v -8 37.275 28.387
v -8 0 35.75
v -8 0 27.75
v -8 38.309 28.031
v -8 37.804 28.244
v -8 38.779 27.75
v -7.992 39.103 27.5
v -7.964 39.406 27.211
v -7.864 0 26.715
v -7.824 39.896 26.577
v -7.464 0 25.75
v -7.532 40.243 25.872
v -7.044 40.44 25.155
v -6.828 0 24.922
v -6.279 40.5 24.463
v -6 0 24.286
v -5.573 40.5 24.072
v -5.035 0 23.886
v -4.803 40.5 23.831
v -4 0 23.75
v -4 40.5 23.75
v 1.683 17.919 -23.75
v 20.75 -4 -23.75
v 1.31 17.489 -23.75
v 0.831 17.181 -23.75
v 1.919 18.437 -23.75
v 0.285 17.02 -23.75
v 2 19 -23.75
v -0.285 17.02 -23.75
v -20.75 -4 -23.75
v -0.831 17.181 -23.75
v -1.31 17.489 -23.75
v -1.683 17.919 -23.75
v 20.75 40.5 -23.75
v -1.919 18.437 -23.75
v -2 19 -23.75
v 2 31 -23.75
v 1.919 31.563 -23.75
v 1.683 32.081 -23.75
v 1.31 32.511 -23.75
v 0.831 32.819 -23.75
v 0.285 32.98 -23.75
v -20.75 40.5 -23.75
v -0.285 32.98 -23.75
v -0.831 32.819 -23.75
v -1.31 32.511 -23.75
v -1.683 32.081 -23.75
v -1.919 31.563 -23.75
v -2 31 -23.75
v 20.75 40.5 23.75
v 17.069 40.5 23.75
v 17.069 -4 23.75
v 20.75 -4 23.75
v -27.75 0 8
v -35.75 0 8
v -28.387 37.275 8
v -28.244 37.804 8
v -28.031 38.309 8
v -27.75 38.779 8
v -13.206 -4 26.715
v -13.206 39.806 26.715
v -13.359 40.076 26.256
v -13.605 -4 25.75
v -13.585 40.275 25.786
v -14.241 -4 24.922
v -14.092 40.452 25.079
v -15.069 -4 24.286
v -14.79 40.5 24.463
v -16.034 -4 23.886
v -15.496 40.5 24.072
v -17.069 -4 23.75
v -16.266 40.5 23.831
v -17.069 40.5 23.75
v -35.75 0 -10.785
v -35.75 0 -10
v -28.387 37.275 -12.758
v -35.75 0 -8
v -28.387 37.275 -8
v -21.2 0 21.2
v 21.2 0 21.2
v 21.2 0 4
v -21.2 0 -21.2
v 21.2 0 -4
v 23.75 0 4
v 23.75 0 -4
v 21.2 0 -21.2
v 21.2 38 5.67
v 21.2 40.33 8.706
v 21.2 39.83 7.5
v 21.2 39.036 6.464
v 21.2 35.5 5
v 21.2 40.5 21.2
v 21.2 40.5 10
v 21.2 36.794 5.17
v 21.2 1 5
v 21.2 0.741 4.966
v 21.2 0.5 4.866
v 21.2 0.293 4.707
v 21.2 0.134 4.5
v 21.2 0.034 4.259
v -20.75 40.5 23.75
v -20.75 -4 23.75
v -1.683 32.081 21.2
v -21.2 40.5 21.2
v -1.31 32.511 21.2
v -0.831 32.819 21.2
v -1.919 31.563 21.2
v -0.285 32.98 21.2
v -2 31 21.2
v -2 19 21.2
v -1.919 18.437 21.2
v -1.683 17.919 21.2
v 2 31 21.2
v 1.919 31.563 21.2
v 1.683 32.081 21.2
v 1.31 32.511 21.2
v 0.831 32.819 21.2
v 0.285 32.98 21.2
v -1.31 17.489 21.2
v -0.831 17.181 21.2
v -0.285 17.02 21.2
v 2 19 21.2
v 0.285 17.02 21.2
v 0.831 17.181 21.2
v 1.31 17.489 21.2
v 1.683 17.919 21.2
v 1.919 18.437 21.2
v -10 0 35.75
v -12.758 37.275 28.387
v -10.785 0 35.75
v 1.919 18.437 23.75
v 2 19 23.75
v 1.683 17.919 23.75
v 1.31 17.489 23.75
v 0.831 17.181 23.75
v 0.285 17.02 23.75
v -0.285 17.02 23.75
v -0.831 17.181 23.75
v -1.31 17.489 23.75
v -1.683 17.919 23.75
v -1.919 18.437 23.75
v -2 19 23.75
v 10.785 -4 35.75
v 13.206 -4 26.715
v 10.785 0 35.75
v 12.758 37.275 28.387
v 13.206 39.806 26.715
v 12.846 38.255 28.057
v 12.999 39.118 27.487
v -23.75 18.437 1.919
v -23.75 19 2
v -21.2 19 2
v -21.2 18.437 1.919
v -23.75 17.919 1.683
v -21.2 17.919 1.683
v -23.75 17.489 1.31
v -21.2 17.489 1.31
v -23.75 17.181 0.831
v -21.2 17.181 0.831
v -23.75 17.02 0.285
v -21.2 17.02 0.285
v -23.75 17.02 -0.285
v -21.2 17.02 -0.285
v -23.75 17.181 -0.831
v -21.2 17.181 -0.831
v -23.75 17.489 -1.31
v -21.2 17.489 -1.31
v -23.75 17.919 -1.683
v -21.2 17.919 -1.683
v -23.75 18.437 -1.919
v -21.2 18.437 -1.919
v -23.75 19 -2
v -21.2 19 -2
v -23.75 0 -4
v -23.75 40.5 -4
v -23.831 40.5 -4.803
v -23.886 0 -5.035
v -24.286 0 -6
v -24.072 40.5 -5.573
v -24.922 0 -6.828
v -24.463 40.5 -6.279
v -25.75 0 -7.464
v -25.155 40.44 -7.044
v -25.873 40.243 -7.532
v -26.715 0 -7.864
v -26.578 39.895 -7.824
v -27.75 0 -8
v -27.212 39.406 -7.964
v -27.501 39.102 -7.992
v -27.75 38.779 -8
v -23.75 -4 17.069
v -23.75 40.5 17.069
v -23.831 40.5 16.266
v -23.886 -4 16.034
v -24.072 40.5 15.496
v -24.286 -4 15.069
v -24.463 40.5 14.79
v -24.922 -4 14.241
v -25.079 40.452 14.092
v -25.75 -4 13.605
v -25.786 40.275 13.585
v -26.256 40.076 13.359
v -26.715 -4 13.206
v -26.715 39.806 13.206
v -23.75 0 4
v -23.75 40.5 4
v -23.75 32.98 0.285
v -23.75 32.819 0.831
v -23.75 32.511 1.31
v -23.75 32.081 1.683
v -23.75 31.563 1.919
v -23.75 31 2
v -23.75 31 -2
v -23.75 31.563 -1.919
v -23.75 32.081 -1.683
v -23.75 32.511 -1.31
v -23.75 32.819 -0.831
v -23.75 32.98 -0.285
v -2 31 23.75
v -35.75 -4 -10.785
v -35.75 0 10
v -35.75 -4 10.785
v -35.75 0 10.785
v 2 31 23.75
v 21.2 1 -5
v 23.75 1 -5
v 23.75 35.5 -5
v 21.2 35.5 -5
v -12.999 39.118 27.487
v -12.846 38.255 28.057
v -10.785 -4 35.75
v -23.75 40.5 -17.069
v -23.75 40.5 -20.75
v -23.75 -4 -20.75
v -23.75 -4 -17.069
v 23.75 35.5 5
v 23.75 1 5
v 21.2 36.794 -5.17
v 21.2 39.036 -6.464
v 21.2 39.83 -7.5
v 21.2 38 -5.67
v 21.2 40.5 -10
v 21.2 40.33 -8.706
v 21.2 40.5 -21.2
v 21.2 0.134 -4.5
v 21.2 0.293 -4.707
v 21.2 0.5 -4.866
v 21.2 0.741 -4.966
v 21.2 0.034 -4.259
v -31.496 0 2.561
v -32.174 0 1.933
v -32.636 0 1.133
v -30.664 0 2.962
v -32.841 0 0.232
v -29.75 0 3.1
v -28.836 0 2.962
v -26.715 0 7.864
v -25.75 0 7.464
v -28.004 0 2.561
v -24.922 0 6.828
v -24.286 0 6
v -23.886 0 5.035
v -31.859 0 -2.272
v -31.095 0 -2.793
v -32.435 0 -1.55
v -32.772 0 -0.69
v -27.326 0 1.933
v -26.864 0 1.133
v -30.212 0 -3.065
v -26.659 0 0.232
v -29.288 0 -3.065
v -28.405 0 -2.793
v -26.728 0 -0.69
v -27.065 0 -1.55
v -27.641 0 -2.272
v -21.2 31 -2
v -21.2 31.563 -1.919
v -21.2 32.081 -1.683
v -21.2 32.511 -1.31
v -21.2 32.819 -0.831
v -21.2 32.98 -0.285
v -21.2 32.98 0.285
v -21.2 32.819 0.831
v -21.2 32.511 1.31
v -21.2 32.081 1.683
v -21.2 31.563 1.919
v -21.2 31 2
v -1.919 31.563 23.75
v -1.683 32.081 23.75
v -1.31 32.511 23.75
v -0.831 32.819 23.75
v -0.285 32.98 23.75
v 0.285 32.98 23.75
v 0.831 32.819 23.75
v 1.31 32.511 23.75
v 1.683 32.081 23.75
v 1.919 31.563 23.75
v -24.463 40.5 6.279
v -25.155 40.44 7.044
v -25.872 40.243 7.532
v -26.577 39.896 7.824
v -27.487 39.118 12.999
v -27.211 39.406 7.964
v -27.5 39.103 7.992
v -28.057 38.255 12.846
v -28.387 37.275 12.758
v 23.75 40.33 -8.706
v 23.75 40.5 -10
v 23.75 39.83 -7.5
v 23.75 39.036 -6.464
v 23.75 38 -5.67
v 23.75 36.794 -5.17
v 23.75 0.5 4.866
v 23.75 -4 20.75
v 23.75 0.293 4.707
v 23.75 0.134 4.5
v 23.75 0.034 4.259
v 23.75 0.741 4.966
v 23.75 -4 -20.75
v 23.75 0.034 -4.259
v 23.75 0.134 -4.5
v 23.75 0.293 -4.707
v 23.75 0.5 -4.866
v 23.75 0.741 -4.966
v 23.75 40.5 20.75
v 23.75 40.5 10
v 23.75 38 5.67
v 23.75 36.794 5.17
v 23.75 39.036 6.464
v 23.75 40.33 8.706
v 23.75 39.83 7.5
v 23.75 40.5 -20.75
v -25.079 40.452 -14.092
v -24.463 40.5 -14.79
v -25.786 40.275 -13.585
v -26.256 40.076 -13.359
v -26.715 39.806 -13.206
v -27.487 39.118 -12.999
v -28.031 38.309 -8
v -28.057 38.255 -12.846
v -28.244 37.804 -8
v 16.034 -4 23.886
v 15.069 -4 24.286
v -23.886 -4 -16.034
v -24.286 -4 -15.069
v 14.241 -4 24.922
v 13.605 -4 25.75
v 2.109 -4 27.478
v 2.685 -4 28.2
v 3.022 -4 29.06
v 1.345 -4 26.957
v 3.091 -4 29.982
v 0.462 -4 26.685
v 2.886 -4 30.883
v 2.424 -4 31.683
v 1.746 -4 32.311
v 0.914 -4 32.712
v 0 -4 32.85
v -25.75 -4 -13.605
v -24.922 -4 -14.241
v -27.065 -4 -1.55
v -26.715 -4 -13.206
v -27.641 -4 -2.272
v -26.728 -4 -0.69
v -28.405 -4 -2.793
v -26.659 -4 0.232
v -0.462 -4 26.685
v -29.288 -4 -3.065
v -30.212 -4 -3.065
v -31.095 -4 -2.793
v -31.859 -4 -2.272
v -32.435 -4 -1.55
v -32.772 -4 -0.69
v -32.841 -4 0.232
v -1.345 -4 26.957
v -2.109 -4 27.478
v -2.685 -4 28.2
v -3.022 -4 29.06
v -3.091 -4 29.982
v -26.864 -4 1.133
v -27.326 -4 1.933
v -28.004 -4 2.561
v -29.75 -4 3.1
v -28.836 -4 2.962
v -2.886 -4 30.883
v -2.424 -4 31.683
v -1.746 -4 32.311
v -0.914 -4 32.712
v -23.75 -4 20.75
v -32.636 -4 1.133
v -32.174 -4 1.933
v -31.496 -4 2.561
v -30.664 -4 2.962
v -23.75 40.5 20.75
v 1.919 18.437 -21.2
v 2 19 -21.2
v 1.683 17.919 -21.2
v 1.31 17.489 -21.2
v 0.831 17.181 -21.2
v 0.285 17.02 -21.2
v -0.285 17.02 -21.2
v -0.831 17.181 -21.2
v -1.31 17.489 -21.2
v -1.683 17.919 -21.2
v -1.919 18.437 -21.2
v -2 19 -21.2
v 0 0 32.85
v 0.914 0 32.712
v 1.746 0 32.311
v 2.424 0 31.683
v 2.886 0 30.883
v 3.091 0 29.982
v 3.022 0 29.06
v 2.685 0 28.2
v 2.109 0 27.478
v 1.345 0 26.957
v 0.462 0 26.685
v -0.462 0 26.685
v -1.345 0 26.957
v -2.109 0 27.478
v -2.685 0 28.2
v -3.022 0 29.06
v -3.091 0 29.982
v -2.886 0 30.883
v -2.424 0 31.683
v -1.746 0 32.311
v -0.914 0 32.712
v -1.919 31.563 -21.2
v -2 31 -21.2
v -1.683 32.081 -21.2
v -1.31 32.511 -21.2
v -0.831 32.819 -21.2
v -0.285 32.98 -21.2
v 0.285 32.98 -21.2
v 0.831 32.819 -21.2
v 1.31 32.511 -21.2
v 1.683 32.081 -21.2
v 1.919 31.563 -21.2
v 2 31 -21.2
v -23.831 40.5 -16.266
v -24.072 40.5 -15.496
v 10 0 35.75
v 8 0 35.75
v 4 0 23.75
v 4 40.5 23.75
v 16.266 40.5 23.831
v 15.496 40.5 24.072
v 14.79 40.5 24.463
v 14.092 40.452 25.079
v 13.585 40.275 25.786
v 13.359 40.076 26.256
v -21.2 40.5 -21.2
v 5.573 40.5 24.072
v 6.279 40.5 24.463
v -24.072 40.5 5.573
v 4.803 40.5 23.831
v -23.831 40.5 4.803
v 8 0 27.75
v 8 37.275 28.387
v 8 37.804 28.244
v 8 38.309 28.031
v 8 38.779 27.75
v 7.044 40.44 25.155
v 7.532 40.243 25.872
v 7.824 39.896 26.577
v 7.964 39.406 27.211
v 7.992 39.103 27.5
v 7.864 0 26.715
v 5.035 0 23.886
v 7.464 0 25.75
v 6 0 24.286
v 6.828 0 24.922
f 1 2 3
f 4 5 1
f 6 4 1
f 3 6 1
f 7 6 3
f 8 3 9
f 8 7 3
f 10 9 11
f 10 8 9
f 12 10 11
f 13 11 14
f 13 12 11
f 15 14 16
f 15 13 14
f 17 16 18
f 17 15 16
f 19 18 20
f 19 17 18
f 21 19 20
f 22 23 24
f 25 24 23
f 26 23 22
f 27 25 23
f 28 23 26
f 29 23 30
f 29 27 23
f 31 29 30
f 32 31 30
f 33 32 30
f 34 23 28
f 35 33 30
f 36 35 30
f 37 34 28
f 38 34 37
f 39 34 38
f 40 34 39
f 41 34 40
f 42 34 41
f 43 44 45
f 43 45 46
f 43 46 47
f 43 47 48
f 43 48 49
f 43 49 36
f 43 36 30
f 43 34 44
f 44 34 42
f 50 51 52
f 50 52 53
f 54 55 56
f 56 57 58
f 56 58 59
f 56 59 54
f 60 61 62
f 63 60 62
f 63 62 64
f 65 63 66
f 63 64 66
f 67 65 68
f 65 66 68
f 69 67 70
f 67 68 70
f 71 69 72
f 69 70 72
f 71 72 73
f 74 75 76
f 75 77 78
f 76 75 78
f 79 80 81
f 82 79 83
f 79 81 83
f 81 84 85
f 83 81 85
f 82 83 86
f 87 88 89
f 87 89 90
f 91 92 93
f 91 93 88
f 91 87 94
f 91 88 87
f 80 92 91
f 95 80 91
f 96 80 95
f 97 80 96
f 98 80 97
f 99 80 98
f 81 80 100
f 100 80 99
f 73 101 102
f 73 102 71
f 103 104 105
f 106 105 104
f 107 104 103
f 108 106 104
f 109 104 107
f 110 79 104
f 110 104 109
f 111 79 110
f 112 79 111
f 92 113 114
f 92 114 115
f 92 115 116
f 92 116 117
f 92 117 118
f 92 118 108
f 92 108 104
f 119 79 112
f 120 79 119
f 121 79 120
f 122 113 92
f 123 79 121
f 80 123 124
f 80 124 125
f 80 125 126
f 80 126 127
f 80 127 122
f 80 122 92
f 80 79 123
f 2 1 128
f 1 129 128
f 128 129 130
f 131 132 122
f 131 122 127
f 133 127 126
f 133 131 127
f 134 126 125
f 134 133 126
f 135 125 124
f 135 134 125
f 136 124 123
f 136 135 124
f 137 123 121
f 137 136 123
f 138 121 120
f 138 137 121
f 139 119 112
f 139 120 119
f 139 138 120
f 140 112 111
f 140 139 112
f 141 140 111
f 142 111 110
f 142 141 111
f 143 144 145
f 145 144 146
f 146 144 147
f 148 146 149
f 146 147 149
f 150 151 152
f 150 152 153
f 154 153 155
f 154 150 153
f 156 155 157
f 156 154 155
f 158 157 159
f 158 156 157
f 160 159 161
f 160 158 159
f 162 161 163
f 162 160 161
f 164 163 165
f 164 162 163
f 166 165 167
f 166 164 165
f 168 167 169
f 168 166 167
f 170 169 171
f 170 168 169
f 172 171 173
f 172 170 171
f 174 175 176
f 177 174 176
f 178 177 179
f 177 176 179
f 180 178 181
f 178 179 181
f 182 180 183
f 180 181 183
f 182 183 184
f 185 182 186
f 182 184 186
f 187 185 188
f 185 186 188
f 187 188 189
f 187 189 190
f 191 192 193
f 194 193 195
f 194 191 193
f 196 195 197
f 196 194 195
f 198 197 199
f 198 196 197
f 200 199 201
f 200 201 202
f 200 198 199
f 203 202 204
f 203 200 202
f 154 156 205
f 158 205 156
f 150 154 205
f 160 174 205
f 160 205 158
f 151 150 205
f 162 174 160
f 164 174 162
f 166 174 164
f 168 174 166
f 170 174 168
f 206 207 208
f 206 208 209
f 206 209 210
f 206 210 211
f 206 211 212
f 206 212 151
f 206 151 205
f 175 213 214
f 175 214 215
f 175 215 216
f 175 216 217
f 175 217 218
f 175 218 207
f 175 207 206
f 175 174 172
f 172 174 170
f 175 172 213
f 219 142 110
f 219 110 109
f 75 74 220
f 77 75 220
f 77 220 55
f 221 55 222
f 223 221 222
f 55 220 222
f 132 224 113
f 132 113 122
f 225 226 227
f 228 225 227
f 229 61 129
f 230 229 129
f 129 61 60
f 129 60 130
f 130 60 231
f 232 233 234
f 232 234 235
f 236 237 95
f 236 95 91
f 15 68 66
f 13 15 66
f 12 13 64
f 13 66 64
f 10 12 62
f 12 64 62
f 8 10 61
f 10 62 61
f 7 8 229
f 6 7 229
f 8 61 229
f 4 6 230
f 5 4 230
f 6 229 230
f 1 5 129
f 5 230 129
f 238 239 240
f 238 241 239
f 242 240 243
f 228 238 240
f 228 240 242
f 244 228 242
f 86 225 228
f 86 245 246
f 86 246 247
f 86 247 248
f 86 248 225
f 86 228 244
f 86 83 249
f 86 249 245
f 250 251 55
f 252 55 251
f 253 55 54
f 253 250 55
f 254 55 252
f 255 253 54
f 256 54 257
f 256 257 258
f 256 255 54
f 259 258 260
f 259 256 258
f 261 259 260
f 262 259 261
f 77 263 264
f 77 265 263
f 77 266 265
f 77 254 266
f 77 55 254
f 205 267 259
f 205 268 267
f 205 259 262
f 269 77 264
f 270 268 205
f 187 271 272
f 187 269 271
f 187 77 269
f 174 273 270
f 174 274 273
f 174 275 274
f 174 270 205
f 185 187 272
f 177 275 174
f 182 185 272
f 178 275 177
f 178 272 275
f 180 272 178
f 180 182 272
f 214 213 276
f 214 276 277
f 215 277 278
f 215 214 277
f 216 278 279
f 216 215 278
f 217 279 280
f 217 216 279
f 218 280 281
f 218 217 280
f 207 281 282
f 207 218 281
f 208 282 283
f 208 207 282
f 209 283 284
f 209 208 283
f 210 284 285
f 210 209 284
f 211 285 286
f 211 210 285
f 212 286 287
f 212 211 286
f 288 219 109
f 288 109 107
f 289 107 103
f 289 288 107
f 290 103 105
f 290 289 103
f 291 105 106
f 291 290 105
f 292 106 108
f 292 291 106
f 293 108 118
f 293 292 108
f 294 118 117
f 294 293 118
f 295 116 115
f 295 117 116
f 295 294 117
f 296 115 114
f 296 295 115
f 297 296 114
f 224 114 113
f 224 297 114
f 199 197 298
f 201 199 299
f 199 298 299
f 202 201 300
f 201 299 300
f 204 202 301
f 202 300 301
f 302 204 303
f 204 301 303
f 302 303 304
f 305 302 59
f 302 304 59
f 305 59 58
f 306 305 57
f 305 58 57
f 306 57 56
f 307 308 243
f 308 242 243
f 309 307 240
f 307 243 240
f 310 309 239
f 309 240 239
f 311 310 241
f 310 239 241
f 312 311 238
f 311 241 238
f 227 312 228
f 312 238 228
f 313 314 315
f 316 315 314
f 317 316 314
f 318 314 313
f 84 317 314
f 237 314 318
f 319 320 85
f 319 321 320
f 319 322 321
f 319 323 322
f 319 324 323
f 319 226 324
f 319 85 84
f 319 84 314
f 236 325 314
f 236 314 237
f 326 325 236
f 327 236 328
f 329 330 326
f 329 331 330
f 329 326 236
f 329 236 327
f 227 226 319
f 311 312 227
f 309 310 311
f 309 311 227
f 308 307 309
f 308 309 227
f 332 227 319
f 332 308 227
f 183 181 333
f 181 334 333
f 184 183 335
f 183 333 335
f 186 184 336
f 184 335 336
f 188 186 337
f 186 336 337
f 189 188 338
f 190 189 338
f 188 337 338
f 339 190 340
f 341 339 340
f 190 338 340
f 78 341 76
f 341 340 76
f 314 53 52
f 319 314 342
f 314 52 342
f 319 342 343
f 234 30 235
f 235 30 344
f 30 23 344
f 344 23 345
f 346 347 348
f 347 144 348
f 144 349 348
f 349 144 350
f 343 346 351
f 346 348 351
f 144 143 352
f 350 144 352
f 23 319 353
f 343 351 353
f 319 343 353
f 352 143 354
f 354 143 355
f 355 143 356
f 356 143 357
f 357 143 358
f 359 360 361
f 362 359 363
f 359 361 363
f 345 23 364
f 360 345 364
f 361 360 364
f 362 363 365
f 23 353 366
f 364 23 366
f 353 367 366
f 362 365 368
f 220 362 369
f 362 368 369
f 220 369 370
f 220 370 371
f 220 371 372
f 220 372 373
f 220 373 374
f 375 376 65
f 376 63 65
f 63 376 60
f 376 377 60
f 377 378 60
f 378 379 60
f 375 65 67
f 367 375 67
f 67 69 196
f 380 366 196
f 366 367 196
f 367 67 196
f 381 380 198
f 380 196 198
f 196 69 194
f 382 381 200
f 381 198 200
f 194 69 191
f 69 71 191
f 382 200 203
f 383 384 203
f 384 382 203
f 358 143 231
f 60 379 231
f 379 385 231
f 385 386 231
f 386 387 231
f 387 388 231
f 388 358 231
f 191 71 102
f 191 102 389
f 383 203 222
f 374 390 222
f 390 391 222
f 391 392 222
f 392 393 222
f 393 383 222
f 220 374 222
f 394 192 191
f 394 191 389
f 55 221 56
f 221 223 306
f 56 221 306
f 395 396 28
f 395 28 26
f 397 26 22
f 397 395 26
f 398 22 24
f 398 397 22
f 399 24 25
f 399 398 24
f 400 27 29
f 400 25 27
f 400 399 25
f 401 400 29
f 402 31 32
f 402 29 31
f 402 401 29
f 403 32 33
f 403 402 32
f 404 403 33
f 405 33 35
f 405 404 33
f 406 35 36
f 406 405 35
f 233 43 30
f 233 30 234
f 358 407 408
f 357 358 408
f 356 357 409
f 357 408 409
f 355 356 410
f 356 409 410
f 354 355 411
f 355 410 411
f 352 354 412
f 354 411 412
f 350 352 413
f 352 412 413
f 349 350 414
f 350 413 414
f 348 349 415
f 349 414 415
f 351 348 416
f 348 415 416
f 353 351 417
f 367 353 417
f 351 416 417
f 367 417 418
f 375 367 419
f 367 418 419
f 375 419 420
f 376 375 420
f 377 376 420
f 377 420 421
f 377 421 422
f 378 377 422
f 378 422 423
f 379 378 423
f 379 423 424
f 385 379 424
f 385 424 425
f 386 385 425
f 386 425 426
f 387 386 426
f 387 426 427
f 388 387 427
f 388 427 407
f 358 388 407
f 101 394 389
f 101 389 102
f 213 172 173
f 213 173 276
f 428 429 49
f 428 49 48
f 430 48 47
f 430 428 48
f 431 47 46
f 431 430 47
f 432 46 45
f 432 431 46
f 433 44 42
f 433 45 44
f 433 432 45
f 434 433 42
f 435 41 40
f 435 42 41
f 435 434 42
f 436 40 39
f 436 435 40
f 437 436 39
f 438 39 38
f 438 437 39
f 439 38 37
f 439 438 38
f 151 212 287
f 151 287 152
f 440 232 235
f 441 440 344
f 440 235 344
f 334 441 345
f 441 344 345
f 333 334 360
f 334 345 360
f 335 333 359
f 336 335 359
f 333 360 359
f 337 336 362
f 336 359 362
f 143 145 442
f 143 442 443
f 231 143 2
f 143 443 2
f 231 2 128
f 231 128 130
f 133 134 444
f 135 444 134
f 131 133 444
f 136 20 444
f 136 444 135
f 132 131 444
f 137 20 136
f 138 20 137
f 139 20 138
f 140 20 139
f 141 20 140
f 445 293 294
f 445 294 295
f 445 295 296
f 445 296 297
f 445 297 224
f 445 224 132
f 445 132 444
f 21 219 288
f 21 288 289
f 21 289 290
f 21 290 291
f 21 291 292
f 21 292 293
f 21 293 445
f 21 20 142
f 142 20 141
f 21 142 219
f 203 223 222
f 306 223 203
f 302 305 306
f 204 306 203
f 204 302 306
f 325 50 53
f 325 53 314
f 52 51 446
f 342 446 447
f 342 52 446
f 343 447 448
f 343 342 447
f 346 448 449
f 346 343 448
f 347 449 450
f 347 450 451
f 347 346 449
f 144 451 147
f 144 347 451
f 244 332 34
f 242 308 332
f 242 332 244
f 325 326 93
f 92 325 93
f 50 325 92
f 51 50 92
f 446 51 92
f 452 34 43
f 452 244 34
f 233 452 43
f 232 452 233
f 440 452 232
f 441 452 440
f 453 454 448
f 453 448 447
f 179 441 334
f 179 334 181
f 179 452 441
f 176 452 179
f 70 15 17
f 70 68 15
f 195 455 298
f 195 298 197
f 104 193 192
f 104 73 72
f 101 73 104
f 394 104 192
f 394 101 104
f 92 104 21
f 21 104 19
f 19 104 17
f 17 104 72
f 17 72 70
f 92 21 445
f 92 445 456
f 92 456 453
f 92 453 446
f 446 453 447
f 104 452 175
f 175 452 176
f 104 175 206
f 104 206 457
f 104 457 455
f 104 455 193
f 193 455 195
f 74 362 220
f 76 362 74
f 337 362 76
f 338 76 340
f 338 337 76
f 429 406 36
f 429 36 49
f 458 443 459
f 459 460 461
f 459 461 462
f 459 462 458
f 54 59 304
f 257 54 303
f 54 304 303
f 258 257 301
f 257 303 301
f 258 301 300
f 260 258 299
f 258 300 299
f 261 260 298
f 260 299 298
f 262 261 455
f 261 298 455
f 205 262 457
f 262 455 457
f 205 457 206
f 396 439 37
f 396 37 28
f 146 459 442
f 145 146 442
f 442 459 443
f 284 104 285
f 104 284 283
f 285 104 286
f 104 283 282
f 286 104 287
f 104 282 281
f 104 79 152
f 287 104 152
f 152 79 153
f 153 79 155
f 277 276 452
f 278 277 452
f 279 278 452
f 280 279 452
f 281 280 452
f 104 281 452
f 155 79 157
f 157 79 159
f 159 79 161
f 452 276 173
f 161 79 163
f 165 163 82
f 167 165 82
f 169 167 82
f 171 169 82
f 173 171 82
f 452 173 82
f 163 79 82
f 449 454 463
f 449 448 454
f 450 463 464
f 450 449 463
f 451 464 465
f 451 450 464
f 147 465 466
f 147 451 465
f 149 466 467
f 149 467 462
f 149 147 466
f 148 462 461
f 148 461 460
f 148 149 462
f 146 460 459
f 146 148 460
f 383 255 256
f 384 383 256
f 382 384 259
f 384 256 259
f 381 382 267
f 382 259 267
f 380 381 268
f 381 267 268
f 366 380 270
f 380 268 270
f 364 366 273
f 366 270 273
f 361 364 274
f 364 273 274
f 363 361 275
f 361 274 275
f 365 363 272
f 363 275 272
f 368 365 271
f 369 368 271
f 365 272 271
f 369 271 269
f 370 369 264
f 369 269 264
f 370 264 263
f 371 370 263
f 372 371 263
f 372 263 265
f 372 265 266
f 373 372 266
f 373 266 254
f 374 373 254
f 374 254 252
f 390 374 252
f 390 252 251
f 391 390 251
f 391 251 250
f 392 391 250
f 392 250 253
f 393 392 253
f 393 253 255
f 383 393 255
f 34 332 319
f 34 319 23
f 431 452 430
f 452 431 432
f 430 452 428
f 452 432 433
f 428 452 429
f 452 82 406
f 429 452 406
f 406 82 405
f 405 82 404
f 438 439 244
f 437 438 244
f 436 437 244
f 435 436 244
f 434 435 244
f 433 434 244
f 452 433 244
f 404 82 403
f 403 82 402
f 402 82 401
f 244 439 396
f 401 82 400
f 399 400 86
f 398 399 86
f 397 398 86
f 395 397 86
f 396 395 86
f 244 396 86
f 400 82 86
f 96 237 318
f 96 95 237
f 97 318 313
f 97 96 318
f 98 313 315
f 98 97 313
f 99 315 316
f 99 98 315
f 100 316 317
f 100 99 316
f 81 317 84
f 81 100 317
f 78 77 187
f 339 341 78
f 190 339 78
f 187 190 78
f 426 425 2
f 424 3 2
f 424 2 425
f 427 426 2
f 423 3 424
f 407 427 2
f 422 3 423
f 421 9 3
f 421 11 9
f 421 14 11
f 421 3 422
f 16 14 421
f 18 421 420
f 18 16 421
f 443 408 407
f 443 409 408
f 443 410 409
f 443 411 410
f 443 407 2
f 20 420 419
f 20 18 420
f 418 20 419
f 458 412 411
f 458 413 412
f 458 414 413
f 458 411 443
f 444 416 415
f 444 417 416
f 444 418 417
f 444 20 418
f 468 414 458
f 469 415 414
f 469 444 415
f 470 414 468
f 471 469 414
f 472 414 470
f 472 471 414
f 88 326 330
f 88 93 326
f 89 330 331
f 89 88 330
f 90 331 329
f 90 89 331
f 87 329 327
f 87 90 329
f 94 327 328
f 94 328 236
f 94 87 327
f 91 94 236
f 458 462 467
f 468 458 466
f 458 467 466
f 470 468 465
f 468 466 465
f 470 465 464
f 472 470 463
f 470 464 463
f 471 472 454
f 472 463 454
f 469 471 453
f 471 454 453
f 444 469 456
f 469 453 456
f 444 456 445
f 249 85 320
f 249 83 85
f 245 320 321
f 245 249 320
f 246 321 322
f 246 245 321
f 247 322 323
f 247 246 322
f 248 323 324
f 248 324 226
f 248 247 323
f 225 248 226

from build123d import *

# Parameters (mm, degrees)
SKETCH1_W                = 47.5
SKETCH1_H                = 47.5
SKETCH1_W_2              = 42.4
SKETCH1_H_2              = 42.4
BOSS_EXTRUDE1_DEPTH      = 40.5
FILLET1_SIZE             = 3
BOSS_EXTRUDE3_DEPTH      = 10
BOSS_EXTRUDE3_DEPTH_BACK = 10
CUT_EXTRUDE1_DEPTH       = 8
CUT_EXTRUDE1_DEPTH_BACK  = 8
BOSS_EXTRUDE4_DEPTH      = 10
BOSS_EXTRUDE4_DEPTH_BACK = 10
CUT_EXTRUDE2_DEPTH       = 8
CUT_EXTRUDE2_DEPTH_BACK  = 8
BOSS_EXTRUDE6_DEPTH      = 4
SKETCH10_R               = 3.1
CUT_EXTRUDE3_DEPTH       = 65.779433465
SKETCH11_R               = 3.1
CUT_EXTRUDE4_DEPTH       = 65.779433465
SKETCH14_W               = 5
SKETCH14_H               = 40.5
CUT_EXTRUDE6_DEPTH       = 10
FILLET9_R                = 5
FILLET10_R               = 1
CUT_EXTRUDE7_DEPTH       = 2.55
CUT_EXTRUDE8_DEPTH       = 72.93443195
CHAMFER1_SIZE            = 4
CHAMFER1_SIZE_2          = 14.92820323
CHAMFER2_SIZE            = 4
CHAMFER2_SIZE_2          = 14.92820323
CHAMFER3_SIZE            = 4
CHAMFER3_SIZE_2          = 14.92820323
FILLET16_R               = 4
FILLET17_R               = 4


with BuildPart() as part:
    # Sketch1 → Boss-Extrude1 (new body)
    with BuildSketch(Plane(origin=(0, 0, 0), x_dir=(1, 0, 0), z_dir=(0, 1, 0))):
        Rectangle(SKETCH1_W, SKETCH1_H)
        Rectangle(SKETCH1_W_2, SKETCH1_H_2, mode=Mode.SUBTRACT)
    extrude(amount=BOSS_EXTRUDE1_DEPTH)

    # Fillet1
    fillet1_edges = [part.edges().sort_by_distance(p)[0] for p in [
        (23.75, 20.25, 23.75),
        (-23.75, 20.25, 23.75),
        (-23.75, 20.25, -23.75),
        (23.75, 20.25, -23.75),
    ]]
    chamfer(fillet1_edges, length=FILLET1_SIZE)

    # Sketch3 → Boss-Extrude3 (add, two sides: drawn at the far end of the back side and taken through both)
    with BuildSketch(Plane.XY.offset(-BOSS_EXTRUDE3_DEPTH_BACK)):
        Polygon((-23.75, 0), (-23.75, 40.5), (-27.75, 40.5), (-35.75, 0), align=None)
    extrude(amount=BOSS_EXTRUDE3_DEPTH + BOSS_EXTRUDE3_DEPTH_BACK)

    # Sketch4 → Cut-Extrude1 (cut, two sides: drawn at the far end of the back side and taken through both)
    with BuildSketch(Plane.XY.offset(-CUT_EXTRUDE1_DEPTH_BACK)):
        Polygon((-35.75, 0), (-23.75, 0), (-23.75, 40.5), (-27.75, 40.5), align=None)
    extrude(amount=CUT_EXTRUDE1_DEPTH + CUT_EXTRUDE1_DEPTH_BACK, mode=Mode.SUBTRACT)

    # Sketch7 → Boss-Extrude4 (add, two sides: drawn at the far end of the back side and taken through both)
    with BuildSketch(Plane(origin=(0, 0, 0), x_dir=(0, 0, -1), z_dir=(1, 0, 0)).offset(-BOSS_EXTRUDE4_DEPTH_BACK)):
        Polygon((-35.75, 0), (-23.75, 0), (-23.75, 40.5), (-27.75, 40.5), align=None)
    extrude(amount=BOSS_EXTRUDE4_DEPTH + BOSS_EXTRUDE4_DEPTH_BACK)

    # Sketch8 → Cut-Extrude2 (cut, two sides: drawn at the far end of the back side and taken through both)
    with BuildSketch(Plane(origin=(0, 0, 0), x_dir=(0, 0, -1), z_dir=(1, 0, 0)).offset(-CUT_EXTRUDE2_DEPTH_BACK)):
        Polygon((-23.75, 0), (-23.75, 40.5), (-27.75, 40.5), (-35.75, 0), align=None)
    extrude(amount=CUT_EXTRUDE2_DEPTH + CUT_EXTRUDE2_DEPTH_BACK, mode=Mode.SUBTRACT)

    # Sketch9 → Boss-Extrude6 (add)
    with BuildSketch(Plane(origin=(0, 0, 0), x_dir=(1, 0, 0), z_dir=(0, 1, 0))):
        Polygon((-35.75, -10), (-23.75, -10), (-23.75, -20.75), (-20.75, -23.75), (-10, -23.75), (-10, -35.75), (10, -35.75), (10, -23.75), (20.75, -23.75), (23.75, -20.75), (23.75, 20.75), (20.75, 23.75), (-20.75, 23.75), (-23.75, 20.75), (-23.75, 10), (-35.75, 10), align=None)
    extrude(amount=-BOSS_EXTRUDE6_DEPTH)

    # Sketch10 → Cut-Extrude3 (cut, through all)
    with BuildSketch(Plane(origin=(0, 0, 0), x_dir=(1, 0, 0), z_dir=(0, 1, 0))):
        with Locations(Location((-29.75, 0, 0), (0, 0, 270))):
            Circle(SKETCH10_R)
    extrude(amount=-CUT_EXTRUDE3_DEPTH, mode=Mode.SUBTRACT)

    # Sketch11 → Cut-Extrude4 (cut, through all)
    with BuildSketch(Plane(origin=(0, 0, 0), x_dir=(1, 0, 0), z_dir=(0, 1, 0))):
        with Locations(Location((0, -29.75, 0), (0, 0, 270))):
            Circle(SKETCH11_R)
    extrude(amount=-CUT_EXTRUDE4_DEPTH, mode=Mode.SUBTRACT)

    # Sketch14 → Cut-Extrude6 (cut)
    with BuildSketch(Plane(origin=(23.75, 0, 0), x_dir=(0, 0, -1), z_dir=(1, 0, 0))):
        with Locations((-2.5, 20.25)):
            Rectangle(SKETCH14_W, SKETCH14_H)
        with Locations((2.5, 20.25)):
            Rectangle(SKETCH14_W, SKETCH14_H)
    extrude(amount=-CUT_EXTRUDE6_DEPTH, mode=Mode.SUBTRACT)

    # Fillet9
    fillet9_edges = [part.edges().sort_by_distance(p)[0] for p in [
        (22.475, 40.5, 5),
        (22.475, 40.5, -5),
    ]]
    fillet(fillet9_edges, radius=FILLET9_R)

    # Fillet10
    fillet10_edges = [part.edges().sort_by_distance(p)[0] for p in [
        (22.475, 0, -5),
        (22.475, 0, 5),
    ]]
    fillet(fillet10_edges, radius=FILLET10_R)

    # Sketch15 → Cut-Extrude7 (cut)
    with BuildSketch(Plane.ZY.offset(23.75)):
        with BuildLine():
            Line((-2, 19), (-2, 31))
            ThreePointArc((-2, 31), (0, 33), (2, 31))
            Line((2, 31), (2, 19))
            ThreePointArc((2, 19), (0, 17), (-2, 19))
        make_face()
    extrude(amount=-CUT_EXTRUDE7_DEPTH, mode=Mode.SUBTRACT)

    # Sketch16 → Cut-Extrude8 (cut, through all)
    with BuildSketch(Plane.XY.offset(23.75)):
        with BuildLine():
            Line((2, 31), (2, 19))
            ThreePointArc((2, 19), (0, 17), (-2, 19))
            Line((-2, 19), (-2, 31))
            ThreePointArc((-2, 31), (0, 33), (2, 31))
        make_face()
    extrude(amount=-CUT_EXTRUDE8_DEPTH, mode=Mode.SUBTRACT)

    # Chamfer1
    # the kernel refuses this chamfer: 14.92820323, 4 mm, written as the material it adds along each edge
    with BuildSketch(Plane(origin=(10, 40.5, 23.75), x_dir=(0.9905000388259542, 0, -0.13751244702129095), z_dir=(0, -1, 0))) as chamfer1_piece_1_section:
        Polygon((CHAMFER1_SIZE * 0.990500038826, CHAMFER1_SIZE * 0.137512447021), (-CHAMFER1_SIZE_2 * 0.137512447024, CHAMFER1_SIZE_2 * 0.990500038844), (0, 0), align=None)
    chamfer1_piece_1 = extrude(amount=44.5, mode=Mode.PRIVATE)
    chamfer1_piece_1 = split(chamfer1_piece_1, bisect_by=Plane(origin=(11.413878062, 16.831768276, 32.425206267), z_dir=(0, -0.19378641821299017, -0.9810437422032618)), keep=Keep.TOP, mode=Mode.PRIVATE)
    chamfer1_piece_1 = split(chamfer1_piece_1, bisect_by=Plane(origin=(11.413878062, 15.820324331, 35.75), z_dir=(0, 0, -1)), keep=Keep.TOP, mode=Mode.PRIVATE)
    add(chamfer1_piece_1)
    with BuildSketch(Plane(origin=(-23.75, 40.5, 10), x_dir=(-0.9999503267608394, 0, -0.009967146577156315), z_dir=(0, -1, 0))) as chamfer1_piece_2_section:
        Polygon((CHAMFER1_SIZE_2 * 0.999950326779, -CHAMFER1_SIZE_2 * 0.00996714657734), (-CHAMFER1_SIZE * 0.00996714657716, -CHAMFER1_SIZE * 0.999950326761), (0, 0), align=None)
    chamfer1_piece_2 = extrude(amount=44.5, mode=Mode.PRIVATE)
    chamfer1_piece_2 = split(chamfer1_piece_2, bisect_by=Plane(origin=(-32.425206267, 16.831768276, 11.413878062), z_dir=(0.9810437422032618, -0.19378641821299017, 0)), keep=Keep.TOP, mode=Mode.PRIVATE)
    chamfer1_piece_2 = split(chamfer1_piece_2, bisect_by=Plane(origin=(-35.75, 15.820324331, 11.413878062), z_dir=(1, 0, 0)), keep=Keep.TOP, mode=Mode.PRIVATE)
    add(chamfer1_piece_2)

    # Chamfer2
    # the kernel refuses this chamfer: 14.92820323, 4 mm, written as the material it adds along each edge
    with BuildSketch(Plane(origin=(-23.75, 40.5, -10), x_dir=(0.13751244702129095, 0, -0.9905000388259542), z_dir=(0, -1, 0))) as chamfer2_piece_1_section:
        Polygon((CHAMFER2_SIZE * 0.990500038826, -CHAMFER2_SIZE * 0.137512447021), (-CHAMFER2_SIZE_2 * 0.137512447024, -CHAMFER2_SIZE_2 * 0.990500038844), (0, 0), align=None)
    chamfer2_piece_1 = extrude(amount=44.5, mode=Mode.PRIVATE)
    chamfer2_piece_1 = split(chamfer2_piece_1, bisect_by=Plane(origin=(-32.425206267, 16.831768276, -11.413878062), z_dir=(0.9810437422032618, -0.19378641821299017, 0)), keep=Keep.TOP, mode=Mode.PRIVATE)
    chamfer2_piece_1 = split(chamfer2_piece_1, bisect_by=Plane(origin=(-35.75, 15.820324331, -11.413878062), z_dir=(1, 0, 0)), keep=Keep.TOP, mode=Mode.PRIVATE)
    add(chamfer2_piece_1)

    # Chamfer3
    # the kernel refuses this chamfer: 14.92820323, 4 mm, written as the material it adds along each edge
    with BuildSketch(Plane(origin=(-10, -4, 23.75), x_dir=(-0.9905000388259542, 0, -0.13751244702129095), z_dir=(0, 1, 0))) as chamfer3_piece_1_section:
        Polygon((CHAMFER3_SIZE * 0.990500038826, CHAMFER3_SIZE * 0.137512447021), (-CHAMFER3_SIZE_2 * 0.137512447024, CHAMFER3_SIZE_2 * 0.990500038844), (0, 0), align=None)
    chamfer3_piece_1 = extrude(amount=44.5, mode=Mode.PRIVATE)
    chamfer3_piece_1 = split(chamfer3_piece_1, bisect_by=Plane(origin=(-11.413878062, 16.831768276, 32.425206267), z_dir=(0, -0.19378641821299017, -0.9810437422032618)), keep=Keep.TOP, mode=Mode.PRIVATE)
    chamfer3_piece_1 = split(chamfer3_piece_1, bisect_by=Plane(origin=(-11.413878062, 15.820324331, 35.75), z_dir=(0, 0, -1)), keep=Keep.TOP, mode=Mode.PRIVATE)
    add(chamfer3_piece_1)

    # Fillet16
    fillet16_edges = [part.edges().sort_by_distance(p)[0] for p in [
        (-8, 20.25, 23.75),
        (8, 20.25, 23.75),
        (-23.75, 18.25, 14),
        (14, 18.25, 23.75),
        (-23.75, 18.25, -14),
        (-14, 18.25, 23.75),
        (-23.75, 20.25, -8),
        (-23.75, 20.25, 8),
    ]]
    fillet(fillet16_edges, radius=FILLET16_R)

    # Fillet17
    fillet17_edges = [part.edges().sort_by_distance(p)[0] for p in [
        (-27.75, 40.5, -10.464101615),
        (-27.75, 40.5, 10.464101615),
        (-10.464101615, 40.5, 27.75),
        (10.464101615, 40.5, 27.75),
    ]]
    fillet(fillet17_edges, radius=FILLET17_R)


solid = part.part
